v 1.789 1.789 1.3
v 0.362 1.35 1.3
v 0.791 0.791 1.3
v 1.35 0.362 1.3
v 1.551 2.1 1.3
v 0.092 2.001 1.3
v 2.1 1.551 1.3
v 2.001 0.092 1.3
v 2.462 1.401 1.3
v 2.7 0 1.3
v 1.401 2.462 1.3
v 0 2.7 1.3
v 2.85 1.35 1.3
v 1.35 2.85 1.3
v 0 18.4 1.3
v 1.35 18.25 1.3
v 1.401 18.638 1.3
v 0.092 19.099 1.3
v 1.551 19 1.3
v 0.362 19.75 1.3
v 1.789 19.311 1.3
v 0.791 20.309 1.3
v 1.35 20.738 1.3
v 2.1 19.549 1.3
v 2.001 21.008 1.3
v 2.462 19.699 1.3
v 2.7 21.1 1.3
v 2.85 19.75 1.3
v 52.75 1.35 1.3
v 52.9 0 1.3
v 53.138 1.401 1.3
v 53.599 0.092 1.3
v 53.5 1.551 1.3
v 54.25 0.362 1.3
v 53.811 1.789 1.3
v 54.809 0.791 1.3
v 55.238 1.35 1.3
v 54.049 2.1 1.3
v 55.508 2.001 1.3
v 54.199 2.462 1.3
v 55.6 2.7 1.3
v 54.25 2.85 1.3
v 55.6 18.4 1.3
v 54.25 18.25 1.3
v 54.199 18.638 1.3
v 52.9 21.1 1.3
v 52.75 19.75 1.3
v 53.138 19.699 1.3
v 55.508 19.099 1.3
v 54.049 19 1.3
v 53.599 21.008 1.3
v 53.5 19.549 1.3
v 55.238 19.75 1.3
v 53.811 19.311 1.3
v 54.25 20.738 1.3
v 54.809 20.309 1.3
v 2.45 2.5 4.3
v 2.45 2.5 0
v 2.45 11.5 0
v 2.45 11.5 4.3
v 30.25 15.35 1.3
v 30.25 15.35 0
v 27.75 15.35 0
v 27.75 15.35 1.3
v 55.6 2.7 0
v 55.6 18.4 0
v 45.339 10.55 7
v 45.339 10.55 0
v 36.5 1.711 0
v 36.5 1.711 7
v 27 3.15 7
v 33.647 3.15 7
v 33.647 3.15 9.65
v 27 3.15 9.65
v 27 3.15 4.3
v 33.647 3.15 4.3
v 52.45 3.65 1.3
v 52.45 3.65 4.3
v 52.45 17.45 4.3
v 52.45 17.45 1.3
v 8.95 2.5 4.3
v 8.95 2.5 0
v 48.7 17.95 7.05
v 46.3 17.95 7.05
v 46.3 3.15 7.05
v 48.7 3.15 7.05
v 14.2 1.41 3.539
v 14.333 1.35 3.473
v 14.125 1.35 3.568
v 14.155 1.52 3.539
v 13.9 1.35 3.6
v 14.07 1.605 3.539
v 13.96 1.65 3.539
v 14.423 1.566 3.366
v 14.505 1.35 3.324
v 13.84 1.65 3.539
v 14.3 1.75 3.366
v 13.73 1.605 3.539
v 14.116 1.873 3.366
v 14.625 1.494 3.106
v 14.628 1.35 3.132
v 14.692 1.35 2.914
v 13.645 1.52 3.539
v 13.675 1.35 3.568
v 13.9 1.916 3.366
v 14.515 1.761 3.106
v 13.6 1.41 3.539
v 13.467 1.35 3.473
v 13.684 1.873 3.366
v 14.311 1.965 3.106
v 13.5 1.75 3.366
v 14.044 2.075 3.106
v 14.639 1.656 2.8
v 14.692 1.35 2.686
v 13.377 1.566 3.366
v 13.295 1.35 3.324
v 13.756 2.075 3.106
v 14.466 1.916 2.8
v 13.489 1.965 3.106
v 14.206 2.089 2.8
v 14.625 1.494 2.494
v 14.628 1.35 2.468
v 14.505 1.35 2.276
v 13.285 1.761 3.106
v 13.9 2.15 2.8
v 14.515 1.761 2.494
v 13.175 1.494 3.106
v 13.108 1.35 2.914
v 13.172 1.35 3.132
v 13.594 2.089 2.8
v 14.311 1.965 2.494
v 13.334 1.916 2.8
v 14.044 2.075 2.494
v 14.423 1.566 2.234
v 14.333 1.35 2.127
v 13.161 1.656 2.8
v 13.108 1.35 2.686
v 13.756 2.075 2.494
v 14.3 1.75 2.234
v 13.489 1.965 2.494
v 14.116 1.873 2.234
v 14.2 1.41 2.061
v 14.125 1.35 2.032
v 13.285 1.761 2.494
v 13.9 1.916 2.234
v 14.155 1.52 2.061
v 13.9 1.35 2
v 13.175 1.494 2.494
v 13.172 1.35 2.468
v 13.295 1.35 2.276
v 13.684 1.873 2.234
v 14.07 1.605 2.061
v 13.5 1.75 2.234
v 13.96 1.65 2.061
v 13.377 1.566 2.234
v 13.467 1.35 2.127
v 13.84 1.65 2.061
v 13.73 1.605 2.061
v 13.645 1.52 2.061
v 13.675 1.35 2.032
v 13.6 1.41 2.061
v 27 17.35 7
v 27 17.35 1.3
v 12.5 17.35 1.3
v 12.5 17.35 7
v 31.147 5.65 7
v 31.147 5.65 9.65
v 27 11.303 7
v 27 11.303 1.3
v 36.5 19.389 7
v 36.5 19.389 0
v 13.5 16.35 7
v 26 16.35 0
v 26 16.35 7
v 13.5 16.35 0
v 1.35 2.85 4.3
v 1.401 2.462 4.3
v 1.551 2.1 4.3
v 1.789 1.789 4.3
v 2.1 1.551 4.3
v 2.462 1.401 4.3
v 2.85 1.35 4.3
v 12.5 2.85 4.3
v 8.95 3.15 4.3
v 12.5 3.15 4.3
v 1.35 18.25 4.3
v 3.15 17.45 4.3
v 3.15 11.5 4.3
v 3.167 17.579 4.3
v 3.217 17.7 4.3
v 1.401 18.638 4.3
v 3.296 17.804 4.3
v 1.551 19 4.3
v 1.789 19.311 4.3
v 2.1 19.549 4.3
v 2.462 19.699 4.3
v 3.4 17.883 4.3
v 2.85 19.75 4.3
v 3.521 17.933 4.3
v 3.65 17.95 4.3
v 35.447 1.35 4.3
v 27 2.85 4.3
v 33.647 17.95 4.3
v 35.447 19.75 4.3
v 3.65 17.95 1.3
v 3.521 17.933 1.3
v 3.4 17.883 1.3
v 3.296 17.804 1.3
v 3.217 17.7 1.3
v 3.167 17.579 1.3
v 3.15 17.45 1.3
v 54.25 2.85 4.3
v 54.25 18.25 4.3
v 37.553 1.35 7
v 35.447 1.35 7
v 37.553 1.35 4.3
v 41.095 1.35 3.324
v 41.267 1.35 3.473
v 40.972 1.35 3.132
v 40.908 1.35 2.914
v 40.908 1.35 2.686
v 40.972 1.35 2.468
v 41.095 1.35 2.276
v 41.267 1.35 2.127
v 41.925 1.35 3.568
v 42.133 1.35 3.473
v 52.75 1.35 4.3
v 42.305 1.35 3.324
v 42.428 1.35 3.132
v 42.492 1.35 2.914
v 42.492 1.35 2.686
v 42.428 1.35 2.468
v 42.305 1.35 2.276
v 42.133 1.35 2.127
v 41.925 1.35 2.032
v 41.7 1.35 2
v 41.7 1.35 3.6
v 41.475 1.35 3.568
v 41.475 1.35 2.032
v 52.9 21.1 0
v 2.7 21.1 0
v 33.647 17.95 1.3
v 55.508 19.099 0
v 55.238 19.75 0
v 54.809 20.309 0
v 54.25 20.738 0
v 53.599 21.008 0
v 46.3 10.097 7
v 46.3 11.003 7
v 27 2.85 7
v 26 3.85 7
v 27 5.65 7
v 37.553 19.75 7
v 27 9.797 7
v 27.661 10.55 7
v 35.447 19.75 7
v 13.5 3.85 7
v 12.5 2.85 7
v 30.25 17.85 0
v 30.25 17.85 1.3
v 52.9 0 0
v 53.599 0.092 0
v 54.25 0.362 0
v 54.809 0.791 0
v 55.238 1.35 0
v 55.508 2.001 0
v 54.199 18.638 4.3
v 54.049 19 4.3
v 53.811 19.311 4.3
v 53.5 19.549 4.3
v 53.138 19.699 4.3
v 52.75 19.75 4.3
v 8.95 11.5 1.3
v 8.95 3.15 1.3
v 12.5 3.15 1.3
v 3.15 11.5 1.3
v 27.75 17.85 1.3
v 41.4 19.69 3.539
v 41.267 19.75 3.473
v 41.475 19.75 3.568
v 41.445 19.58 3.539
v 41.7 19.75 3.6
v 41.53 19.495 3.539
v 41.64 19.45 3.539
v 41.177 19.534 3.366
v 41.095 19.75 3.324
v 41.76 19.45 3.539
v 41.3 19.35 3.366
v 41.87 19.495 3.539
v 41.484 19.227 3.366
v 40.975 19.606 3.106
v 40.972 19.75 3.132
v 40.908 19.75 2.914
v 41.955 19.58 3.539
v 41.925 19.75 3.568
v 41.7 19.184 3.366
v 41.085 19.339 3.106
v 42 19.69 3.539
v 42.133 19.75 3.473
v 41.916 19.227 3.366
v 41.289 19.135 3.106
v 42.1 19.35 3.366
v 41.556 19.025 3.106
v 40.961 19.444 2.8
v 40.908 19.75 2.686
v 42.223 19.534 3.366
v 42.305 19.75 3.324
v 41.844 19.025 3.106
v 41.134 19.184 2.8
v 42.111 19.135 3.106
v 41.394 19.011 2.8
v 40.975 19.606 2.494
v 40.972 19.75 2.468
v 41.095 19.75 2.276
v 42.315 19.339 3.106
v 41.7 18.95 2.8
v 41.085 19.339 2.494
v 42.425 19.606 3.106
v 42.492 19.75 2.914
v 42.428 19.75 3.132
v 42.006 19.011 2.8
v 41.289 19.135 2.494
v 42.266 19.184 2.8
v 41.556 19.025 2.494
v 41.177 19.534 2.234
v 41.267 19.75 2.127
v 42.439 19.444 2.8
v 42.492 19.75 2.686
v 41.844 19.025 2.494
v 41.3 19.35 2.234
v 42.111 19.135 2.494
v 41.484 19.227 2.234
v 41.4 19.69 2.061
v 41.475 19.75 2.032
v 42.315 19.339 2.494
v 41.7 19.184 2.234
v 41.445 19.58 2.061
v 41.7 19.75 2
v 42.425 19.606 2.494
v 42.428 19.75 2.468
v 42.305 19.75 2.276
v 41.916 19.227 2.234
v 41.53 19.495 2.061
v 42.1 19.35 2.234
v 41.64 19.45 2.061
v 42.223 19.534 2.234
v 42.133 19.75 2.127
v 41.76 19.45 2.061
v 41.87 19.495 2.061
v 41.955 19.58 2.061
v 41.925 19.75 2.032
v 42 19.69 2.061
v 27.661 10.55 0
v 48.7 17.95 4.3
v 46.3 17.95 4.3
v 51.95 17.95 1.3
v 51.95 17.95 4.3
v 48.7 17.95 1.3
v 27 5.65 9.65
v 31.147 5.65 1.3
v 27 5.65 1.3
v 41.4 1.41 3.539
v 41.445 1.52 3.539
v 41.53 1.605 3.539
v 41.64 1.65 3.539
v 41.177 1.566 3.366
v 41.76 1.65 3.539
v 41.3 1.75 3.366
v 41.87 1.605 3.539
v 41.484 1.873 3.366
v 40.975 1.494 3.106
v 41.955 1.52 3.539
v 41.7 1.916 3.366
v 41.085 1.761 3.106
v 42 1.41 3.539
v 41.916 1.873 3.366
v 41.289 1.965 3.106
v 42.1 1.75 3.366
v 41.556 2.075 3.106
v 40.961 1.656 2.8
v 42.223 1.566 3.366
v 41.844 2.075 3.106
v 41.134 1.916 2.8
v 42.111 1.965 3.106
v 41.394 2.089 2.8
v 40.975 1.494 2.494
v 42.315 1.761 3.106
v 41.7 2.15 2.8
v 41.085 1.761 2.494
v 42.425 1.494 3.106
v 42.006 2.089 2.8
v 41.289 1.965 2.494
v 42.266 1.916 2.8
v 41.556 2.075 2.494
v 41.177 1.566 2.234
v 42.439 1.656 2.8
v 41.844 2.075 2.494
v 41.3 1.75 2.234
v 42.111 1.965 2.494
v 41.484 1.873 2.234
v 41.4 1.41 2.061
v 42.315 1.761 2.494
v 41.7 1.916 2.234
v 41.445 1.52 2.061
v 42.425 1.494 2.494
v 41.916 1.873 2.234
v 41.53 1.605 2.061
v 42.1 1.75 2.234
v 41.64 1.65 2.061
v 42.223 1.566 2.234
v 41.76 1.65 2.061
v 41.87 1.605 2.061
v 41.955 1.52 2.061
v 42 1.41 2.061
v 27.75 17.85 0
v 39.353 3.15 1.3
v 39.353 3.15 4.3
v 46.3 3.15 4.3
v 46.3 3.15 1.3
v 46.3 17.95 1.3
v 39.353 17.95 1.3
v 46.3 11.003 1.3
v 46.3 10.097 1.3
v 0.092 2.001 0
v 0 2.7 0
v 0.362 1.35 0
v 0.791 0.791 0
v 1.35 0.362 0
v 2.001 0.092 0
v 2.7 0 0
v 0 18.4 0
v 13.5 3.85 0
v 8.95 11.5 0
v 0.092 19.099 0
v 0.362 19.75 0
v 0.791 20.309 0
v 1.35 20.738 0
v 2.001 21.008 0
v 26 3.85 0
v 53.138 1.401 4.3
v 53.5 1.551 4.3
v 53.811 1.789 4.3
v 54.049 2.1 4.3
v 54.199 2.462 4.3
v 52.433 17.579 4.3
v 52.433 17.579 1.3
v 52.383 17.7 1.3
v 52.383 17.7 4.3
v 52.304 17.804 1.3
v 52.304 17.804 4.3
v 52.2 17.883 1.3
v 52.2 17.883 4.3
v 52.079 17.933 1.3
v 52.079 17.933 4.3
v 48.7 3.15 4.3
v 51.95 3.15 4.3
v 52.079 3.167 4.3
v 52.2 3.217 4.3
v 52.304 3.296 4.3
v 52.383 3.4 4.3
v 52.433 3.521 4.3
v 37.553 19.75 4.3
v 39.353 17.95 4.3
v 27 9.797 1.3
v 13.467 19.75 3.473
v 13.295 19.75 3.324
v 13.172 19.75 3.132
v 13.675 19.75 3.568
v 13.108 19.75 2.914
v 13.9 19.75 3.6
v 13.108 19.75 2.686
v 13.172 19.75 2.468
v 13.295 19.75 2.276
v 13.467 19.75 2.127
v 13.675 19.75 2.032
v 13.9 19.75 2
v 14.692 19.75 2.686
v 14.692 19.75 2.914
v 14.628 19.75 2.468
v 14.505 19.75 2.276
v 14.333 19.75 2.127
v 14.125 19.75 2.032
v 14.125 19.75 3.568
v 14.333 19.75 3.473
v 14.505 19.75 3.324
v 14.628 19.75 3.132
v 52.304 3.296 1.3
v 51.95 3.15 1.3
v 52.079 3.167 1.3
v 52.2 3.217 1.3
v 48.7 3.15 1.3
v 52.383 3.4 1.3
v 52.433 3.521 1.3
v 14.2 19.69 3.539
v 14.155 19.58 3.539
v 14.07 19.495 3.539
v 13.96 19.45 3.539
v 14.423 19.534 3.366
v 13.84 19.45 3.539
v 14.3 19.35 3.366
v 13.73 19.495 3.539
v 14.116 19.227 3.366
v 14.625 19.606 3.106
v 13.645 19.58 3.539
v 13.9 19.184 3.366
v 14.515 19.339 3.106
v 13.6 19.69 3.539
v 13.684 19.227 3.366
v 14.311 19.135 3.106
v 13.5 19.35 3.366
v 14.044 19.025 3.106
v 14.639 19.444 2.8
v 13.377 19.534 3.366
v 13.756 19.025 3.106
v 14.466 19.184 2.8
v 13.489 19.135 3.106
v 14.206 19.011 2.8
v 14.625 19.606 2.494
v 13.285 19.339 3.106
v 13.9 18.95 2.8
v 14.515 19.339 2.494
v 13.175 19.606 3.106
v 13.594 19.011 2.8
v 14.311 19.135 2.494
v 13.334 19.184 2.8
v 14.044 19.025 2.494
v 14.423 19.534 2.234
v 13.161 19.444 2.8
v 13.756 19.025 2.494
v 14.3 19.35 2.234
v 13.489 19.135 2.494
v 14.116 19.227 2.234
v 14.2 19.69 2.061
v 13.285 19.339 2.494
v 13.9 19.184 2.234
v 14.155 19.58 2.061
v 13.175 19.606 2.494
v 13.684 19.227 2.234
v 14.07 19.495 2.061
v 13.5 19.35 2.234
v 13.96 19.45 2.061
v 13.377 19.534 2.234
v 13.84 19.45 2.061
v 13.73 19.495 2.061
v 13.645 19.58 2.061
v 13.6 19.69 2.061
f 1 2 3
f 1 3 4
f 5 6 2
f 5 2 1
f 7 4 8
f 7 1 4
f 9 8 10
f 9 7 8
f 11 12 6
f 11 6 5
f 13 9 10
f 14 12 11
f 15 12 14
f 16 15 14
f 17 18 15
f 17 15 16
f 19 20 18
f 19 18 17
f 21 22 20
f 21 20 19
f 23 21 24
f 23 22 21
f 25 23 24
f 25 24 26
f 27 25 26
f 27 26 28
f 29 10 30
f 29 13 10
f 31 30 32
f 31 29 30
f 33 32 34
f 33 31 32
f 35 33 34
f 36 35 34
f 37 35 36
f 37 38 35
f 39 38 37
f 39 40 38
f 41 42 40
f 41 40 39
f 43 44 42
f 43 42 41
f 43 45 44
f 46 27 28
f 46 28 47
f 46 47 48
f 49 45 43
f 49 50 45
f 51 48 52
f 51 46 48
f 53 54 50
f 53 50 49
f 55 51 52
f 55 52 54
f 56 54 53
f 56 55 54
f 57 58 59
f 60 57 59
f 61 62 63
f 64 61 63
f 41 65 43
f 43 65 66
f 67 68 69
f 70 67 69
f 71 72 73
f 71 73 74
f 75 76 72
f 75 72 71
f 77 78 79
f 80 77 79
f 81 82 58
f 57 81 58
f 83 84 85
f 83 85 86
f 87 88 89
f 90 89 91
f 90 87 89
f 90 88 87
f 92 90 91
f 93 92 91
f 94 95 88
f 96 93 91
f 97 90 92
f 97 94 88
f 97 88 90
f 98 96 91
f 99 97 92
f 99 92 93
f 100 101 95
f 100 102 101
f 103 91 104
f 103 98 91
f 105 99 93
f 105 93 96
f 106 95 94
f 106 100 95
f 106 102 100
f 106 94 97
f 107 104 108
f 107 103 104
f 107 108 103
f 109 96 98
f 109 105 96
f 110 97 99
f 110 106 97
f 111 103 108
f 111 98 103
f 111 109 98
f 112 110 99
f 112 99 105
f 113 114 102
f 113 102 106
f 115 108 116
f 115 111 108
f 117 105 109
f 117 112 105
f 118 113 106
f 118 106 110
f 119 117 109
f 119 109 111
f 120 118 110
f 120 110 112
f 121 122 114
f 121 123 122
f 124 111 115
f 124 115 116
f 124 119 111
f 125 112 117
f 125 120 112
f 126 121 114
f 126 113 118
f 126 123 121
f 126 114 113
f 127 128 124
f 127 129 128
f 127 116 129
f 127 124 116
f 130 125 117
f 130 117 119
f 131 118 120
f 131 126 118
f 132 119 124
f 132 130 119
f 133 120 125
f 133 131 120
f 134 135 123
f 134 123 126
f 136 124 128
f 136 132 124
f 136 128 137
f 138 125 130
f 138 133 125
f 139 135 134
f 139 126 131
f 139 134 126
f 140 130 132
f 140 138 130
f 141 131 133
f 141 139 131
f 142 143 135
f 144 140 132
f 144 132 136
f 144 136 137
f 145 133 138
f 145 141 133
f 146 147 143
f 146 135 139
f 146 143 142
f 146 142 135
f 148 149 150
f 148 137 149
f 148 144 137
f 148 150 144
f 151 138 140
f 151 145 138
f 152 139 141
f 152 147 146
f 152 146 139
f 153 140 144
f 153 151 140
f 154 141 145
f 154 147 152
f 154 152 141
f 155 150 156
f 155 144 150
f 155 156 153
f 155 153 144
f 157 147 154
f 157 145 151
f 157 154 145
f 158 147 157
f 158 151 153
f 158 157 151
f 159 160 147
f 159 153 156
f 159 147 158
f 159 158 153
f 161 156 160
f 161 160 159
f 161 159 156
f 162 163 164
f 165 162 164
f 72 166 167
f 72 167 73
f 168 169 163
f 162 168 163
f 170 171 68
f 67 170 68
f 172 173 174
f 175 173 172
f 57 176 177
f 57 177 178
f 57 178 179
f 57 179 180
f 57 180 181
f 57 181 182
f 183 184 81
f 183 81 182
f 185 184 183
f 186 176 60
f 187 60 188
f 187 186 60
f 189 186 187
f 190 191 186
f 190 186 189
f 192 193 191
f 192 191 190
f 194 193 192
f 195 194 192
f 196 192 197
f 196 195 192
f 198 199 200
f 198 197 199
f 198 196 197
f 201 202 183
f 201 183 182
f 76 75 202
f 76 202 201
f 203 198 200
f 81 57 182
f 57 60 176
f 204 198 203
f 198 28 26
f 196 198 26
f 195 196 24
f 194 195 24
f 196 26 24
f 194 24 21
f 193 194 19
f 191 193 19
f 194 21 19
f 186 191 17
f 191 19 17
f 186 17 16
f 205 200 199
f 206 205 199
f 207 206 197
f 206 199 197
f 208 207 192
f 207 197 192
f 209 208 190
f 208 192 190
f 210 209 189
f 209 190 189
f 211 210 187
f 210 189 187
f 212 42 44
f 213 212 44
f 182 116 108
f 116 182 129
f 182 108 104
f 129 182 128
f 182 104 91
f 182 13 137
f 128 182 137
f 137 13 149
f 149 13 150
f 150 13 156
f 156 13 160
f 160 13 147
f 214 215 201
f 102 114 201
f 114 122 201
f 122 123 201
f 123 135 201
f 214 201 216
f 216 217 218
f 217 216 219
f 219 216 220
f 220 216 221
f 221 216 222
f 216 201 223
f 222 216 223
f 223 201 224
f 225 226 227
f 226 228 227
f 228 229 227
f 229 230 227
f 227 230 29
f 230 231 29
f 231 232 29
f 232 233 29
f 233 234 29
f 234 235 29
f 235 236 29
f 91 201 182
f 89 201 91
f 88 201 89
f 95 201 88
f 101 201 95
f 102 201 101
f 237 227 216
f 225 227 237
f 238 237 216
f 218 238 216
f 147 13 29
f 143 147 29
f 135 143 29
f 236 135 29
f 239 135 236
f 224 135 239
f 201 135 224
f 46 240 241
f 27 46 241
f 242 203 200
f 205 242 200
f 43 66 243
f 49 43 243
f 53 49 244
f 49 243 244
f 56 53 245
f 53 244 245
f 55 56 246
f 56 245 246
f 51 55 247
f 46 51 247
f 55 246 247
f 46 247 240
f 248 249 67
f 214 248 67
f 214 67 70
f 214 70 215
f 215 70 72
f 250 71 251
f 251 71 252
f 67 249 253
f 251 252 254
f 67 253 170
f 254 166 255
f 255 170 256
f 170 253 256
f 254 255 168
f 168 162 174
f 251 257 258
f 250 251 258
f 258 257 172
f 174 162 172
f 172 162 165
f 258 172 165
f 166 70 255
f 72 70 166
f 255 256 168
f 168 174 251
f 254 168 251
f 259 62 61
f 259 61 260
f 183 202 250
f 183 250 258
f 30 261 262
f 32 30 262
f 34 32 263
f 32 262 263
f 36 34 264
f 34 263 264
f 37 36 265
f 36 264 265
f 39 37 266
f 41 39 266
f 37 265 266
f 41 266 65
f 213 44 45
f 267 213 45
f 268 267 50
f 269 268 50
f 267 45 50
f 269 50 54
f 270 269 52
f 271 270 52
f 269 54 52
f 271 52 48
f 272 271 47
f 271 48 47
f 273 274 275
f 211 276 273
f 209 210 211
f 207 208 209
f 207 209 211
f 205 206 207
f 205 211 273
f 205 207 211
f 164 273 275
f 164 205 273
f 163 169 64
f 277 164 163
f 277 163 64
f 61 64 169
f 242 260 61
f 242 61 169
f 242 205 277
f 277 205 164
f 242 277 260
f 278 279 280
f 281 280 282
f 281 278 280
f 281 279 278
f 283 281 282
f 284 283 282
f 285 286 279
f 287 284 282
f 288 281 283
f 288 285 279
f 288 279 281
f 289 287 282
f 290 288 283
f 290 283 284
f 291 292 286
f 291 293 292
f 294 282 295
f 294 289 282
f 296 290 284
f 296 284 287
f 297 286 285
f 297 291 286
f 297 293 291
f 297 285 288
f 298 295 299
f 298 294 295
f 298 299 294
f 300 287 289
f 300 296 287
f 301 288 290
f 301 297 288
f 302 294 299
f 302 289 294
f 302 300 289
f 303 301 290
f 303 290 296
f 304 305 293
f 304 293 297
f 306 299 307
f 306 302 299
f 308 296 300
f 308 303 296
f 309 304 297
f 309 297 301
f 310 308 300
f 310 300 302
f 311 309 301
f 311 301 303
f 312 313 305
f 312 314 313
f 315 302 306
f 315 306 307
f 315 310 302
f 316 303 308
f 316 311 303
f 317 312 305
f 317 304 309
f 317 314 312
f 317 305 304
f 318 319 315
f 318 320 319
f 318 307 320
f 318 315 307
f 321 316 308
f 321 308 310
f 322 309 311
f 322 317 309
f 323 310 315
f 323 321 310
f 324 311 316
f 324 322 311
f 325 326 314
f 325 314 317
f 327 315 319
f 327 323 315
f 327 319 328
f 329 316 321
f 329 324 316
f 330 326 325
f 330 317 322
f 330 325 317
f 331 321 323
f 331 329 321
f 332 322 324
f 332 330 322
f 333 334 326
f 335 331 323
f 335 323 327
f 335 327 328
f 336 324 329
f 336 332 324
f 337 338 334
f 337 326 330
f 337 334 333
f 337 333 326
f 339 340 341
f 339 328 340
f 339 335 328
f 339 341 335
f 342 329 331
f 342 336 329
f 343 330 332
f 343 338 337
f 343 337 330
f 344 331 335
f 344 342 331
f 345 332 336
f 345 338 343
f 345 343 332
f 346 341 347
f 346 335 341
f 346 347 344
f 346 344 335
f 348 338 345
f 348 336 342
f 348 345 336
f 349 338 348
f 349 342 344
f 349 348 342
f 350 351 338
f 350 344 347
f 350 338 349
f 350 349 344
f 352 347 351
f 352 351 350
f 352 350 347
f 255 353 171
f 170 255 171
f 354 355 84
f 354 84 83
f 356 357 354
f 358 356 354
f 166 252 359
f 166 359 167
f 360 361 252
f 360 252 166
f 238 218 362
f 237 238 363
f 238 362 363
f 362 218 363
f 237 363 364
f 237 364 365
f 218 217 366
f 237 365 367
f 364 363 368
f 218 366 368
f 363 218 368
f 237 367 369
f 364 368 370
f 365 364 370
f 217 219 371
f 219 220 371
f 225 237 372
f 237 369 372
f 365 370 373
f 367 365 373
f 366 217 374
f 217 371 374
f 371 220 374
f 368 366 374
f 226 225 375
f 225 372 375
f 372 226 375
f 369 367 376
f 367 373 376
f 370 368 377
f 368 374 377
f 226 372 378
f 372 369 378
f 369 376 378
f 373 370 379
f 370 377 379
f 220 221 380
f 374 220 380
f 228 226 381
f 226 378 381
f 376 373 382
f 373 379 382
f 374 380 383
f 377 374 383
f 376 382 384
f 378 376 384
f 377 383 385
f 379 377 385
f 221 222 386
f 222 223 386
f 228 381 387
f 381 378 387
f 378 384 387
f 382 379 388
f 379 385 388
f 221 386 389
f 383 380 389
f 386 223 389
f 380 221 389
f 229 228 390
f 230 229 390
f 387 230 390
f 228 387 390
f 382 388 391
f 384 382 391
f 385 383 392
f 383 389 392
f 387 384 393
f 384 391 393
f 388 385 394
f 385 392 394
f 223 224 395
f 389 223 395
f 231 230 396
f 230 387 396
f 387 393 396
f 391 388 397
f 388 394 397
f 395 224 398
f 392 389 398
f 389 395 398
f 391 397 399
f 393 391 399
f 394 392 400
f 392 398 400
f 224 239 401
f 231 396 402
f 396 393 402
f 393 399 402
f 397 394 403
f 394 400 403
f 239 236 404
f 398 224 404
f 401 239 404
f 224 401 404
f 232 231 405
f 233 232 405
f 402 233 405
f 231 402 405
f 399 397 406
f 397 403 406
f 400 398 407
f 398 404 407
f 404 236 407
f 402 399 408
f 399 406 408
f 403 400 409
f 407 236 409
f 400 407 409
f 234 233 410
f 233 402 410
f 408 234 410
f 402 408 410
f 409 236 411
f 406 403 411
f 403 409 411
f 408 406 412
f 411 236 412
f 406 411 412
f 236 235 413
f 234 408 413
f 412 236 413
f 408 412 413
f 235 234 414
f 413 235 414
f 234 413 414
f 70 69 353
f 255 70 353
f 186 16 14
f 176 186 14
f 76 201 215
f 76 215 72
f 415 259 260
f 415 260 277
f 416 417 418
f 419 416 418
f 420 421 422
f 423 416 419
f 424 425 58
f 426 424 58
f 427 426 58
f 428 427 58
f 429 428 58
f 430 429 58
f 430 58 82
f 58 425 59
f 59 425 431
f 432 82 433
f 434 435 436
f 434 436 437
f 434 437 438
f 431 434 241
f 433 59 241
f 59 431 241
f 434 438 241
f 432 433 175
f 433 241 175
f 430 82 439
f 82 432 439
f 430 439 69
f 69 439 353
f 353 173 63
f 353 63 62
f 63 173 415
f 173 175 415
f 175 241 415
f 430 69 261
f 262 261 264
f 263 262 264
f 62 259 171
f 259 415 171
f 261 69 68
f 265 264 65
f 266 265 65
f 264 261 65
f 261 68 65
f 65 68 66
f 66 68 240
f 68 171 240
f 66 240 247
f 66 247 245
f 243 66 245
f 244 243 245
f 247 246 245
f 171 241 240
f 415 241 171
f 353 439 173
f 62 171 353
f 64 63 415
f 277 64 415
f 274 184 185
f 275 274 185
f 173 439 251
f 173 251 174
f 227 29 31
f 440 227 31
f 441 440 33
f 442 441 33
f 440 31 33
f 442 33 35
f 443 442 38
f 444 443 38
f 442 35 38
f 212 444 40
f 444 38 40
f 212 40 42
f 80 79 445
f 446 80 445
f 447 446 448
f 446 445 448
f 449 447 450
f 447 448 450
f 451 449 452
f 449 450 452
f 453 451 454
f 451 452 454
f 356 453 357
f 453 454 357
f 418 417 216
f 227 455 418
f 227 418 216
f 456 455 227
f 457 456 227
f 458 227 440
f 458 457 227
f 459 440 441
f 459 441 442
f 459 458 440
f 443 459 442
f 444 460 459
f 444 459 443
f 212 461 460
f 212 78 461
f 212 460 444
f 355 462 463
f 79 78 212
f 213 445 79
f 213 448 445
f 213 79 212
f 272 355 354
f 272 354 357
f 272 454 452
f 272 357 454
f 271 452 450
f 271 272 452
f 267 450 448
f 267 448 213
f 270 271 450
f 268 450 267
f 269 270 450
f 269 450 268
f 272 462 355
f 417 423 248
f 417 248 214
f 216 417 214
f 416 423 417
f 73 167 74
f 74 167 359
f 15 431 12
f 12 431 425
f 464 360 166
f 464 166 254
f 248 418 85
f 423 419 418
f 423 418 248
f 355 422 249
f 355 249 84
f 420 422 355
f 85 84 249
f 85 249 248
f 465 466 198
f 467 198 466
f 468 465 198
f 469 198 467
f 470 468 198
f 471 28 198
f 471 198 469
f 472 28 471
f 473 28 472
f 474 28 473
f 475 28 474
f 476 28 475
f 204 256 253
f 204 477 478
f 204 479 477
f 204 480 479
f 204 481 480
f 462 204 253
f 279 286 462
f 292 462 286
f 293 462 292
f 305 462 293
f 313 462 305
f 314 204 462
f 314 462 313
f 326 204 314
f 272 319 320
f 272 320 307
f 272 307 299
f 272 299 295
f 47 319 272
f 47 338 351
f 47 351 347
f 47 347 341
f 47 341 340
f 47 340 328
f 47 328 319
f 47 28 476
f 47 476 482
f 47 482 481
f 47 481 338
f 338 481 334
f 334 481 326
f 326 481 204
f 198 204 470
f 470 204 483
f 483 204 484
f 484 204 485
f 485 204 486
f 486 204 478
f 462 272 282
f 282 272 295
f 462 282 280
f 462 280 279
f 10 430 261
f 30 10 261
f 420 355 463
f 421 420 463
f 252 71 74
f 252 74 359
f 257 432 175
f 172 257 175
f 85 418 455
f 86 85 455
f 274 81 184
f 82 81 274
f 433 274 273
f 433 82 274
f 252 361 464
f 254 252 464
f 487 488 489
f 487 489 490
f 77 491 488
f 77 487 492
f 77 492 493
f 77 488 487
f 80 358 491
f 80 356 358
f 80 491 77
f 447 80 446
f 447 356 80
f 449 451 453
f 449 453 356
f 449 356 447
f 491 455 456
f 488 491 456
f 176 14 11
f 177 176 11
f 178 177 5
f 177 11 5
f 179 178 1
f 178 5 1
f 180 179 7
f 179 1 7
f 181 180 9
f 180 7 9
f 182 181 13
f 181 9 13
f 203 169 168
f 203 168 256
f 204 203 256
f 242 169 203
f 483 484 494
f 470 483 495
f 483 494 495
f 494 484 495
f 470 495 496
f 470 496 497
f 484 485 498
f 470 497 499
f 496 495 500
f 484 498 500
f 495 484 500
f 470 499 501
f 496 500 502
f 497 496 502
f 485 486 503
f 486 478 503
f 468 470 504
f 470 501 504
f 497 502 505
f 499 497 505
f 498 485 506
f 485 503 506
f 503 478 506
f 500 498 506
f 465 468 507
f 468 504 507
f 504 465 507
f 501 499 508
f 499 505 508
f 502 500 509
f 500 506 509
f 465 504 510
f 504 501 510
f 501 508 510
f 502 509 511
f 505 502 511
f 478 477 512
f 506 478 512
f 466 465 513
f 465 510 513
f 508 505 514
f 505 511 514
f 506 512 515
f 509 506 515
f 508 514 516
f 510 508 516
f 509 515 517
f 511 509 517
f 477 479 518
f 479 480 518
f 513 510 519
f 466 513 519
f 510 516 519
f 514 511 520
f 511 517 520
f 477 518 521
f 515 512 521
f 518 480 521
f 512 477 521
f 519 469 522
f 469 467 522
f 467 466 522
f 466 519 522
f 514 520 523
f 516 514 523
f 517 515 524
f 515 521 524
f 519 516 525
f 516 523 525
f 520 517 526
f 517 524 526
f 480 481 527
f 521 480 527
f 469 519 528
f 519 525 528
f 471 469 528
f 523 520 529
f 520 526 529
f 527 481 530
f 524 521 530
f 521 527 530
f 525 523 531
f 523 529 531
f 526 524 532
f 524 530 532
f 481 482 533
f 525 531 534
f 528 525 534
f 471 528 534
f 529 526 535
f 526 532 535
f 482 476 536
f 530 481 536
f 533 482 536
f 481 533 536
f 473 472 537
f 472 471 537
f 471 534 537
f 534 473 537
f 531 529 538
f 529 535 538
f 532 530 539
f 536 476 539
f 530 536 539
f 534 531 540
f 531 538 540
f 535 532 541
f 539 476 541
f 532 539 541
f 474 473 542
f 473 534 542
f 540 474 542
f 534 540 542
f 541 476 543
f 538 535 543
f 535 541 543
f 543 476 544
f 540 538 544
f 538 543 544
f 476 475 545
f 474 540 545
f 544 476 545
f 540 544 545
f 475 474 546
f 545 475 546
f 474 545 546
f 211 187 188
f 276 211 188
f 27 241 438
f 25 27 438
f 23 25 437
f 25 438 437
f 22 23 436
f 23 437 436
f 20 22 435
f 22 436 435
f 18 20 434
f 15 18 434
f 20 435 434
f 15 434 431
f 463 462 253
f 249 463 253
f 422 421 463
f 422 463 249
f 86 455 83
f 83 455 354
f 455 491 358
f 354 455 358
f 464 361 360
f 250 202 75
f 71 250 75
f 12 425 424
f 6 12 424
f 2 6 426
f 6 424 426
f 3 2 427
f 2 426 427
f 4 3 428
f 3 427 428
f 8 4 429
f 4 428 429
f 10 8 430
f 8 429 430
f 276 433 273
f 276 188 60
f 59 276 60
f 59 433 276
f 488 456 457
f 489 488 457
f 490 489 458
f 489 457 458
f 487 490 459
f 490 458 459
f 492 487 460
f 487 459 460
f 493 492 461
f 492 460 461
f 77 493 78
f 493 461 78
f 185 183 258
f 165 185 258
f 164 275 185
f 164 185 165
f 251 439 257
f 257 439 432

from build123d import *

# Parameters (mm, degrees)
BOSS_EXTRUDE1_DEPTH = 1.3
BOSS_EXTRUDE3_DEPTH = 3
CUT_EXTRUDE1_DEPTH  = 3
SKETCH11_W          = 6.5
SKETCH11_H          = 9
CUT_EXTRUDE2_DEPTH  = 4.3
SKETCH12_W          = 12.5
SKETCH12_H          = 12.5
CUT_EXTRUDE4_DEPTH  = 1.3
SKETCH17_W          = 14.5
SKETCH17_H          = 14.5
SKETCH17_W_2        = 12.5
SKETCH17_H_2        = 12.5
BOSS_EXTRUDE4_DEPTH = 7
CUT_EXTRUDE5_DEPTH  = 4.3
BOSS_EXTRUDE5_DEPTH = 7
CUT_EXTRUDE6_START  = -3
CUT_EXTRUDE6_DEPTH  = 23
SKETCH21_W          = 2.5
SKETCH21_H          = 2.5
CUT_EXTRUDE7_DEPTH  = 10
SKETCH23_W          = 2.4
SKETCH23_H          = 14.8
BOSS_EXTRUDE6_DEPTH = 5.75
BOSS_EXTRUDE7_DEPTH = 8.35


with BuildPart() as part:
    # Sketch1 → Boss-Extrude1 (new body)
    with BuildSketch(Plane.XY):
        with BuildLine():
            Line((2.7, 0), (52.9, 0))
            ThreePointArc((52.9, 0), (54.809188309, 0.790811691), (55.6, 2.7))
            Line((55.6, 2.7), (55.6, 18.4))
            ThreePointArc((55.6, 18.4), (54.809188309, 20.309188309), (52.9, 21.1))
            Line((52.9, 21.1), (2.7, 21.1))
            ThreePointArc((2.7, 21.1), (0.790811691, 20.309188309), (0, 18.4))
            Line((0, 18.4), (0, 2.7))
            ThreePointArc((0, 2.7), (0.790811691, 0.790811691), (2.7, 0))
        make_face()
    extrude(amount=BOSS_EXTRUDE1_DEPTH)

    # Sketch4 → Boss-Extrude3 (add)
    with BuildSketch(Plane.XY.offset(1.3)):
        with BuildLine():
            Line((54.25, 2.85), (54.25, 18.25))
            ThreePointArc((54.25, 18.25), (53.810660172, 19.310660172), (52.75, 19.75))
            Line((52.75, 19.75), (2.85, 19.75))
            ThreePointArc((2.85, 19.75), (1.789339828, 19.310660172), (1.35, 18.25))
            Line((1.35, 18.25), (1.35, 2.85))
            ThreePointArc((1.35, 2.85), (1.789339828, 1.789339828), (2.85, 1.35))
            Line((2.85, 1.35), (52.75, 1.35))
            ThreePointArc((52.75, 1.35), (53.810660172, 1.789339828), (54.25, 2.85))
        make_face()
    extrude(amount=BOSS_EXTRUDE3_DEPTH)

    # Sketch5 → Cut-Extrude1 (cut)
    with BuildSketch(Plane.XY.offset(4.3)):
        with BuildLine():
            Line((51.95, 17.95), (3.65, 17.95))
            ThreePointArc((3.65, 17.95), (3.296446609, 17.803553391), (3.15, 17.45))
            Line((3.15, 17.45), (3.15, 3.65))
            ThreePointArc((3.15, 3.65), (3.296446609, 3.296446609), (3.65, 3.15))
            Line((3.65, 3.15), (51.95, 3.15))
            ThreePointArc((51.95, 3.15), (52.303553391, 3.296446609), (52.45, 3.65))
            Line((52.45, 3.65), (52.45, 17.45))
            ThreePointArc((52.45, 17.45), (52.303553391, 17.803553391), (51.95, 17.95))
        make_face()
    extrude(amount=-CUT_EXTRUDE1_DEPTH, mode=Mode.SUBTRACT)

    # Sketch10 → Cut-Revolve1 (revolve, cut)
    with BuildSketch(Plane(origin=(0, 19.75, 0), x_dir=(1, 0, 0), z_dir=(0, 1, 0))):
        with BuildLine():
            Line((41.7, -2), (41.7, -3.6))
            ThreePointArc((41.7, -3.6), (40.9, -2.8), (41.7, -2))
        make_face()
    cut_revolve1 = revolve(axis=Axis((41.7, 19.75, 2), (0, 0, 1)), mode=Mode.SUBTRACT)

    # Mirror1: Cut-Revolve1 across plane
    add(cut_revolve1.mirror(Plane(origin=(0, 10.55, 0), x_dir=(0, 0, 1), z_dir=(0, -1, 0))), mode=Mode.SUBTRACT)

    # Sketch11 → Cut-Extrude2 (cut)
    with BuildSketch(Plane(origin=(0, 0, 0), x_dir=(-1, 0, 0), z_dir=(0, 0, -1))):
        with Locations((-5.7, 7)):
            Rectangle(SKETCH11_W, SKETCH11_H)
    extrude(amount=-CUT_EXTRUDE2_DEPTH, mode=Mode.SUBTRACT)

    # Sketch12 → Cut-Extrude4 (cut)
    with BuildSketch(Plane(origin=(0, 0, 0), x_dir=(-1, 0, 0), z_dir=(0, 0, -1))):
        with Locations((-19.75, 10.1)):
            Rectangle(SKETCH12_W, SKETCH12_H)
    extrude(amount=-CUT_EXTRUDE4_DEPTH, mode=Mode.SUBTRACT)

    # Sketch17 → Boss-Extrude4 (add)
    with BuildSketch(Plane(origin=(0, 0, 0), x_dir=(-1, 0, 0), z_dir=(0, 0, -1))):
        with Locations((-19.75, 10.1)):
            Rectangle(SKETCH17_W, SKETCH17_H)
        with Locations((-19.75, 10.1)):
            Rectangle(SKETCH17_W_2, SKETCH17_H_2, mode=Mode.SUBTRACT)
    extrude(amount=-BOSS_EXTRUDE4_DEPTH)

    # Sketch13 → Cut-Extrude5 (cut)
    with BuildSketch(Plane(origin=(0, 0, 0), x_dir=(-1, 0, 0), z_dir=(0, 0, -1))):
        Polygon((-45.338834765, 10.55), (-36.5, 1.711165235), (-27.661165235, 10.55), (-36.5, 19.388834765), align=None)
    extrude(amount=-CUT_EXTRUDE5_DEPTH, mode=Mode.SUBTRACT)

    # Sketch18 → Boss-Extrude5 (add)
    with BuildSketch(Plane(origin=(0, 0, 0), x_dir=(-1, 0, 0), z_dir=(0, 0, -1))):
        Polygon((-46.753048327, 10.55), (-36.5, 0.296951673), (-26.246951673, 10.55), (-36.5, 20.803048327), align=None)
        Polygon((-36.5, 19.388834765), (-45.338834765, 10.55), (-36.5, 1.711165235), (-27.661165235, 10.55), align=None, mode=Mode.SUBTRACT)
    extrude(amount=-BOSS_EXTRUDE5_DEPTH)

    # Sketch20 → Cut-Extrude6 (cut)
    with BuildSketch(Plane.XY.offset(4.3).offset(CUT_EXTRUDE6_START)):
        Polygon((35.446951673, 19.75), (37.553048327, 19.75), (36.5, 20.803048327), align=None)
    cut_extrude6 = extrude(amount=CUT_EXTRUDE6_DEPTH, mode=Mode.SUBTRACT)

    # Mirror2: Cut-Extrude6 across plane
    add(cut_extrude6.mirror(Plane(origin=(0, 10.55, 0), x_dir=(0, 0, 1), z_dir=(0, -1, 0))), mode=Mode.SUBTRACT)

    # Sketch21 → Cut-Extrude7 (cut)
    with BuildSketch(Plane(origin=(0, 0, 0), x_dir=(-1, 0, 0), z_dir=(0, 0, -1))):
        with Locations((-29, 16.6)):
            Rectangle(SKETCH21_W, SKETCH21_H)
    extrude(amount=-CUT_EXTRUDE7_DEPTH, mode=Mode.SUBTRACT)

    # Mirror3: Cut-Revolve1 across plane
    add(cut_revolve1.mirror(Plane.ZY.offset(-27.8)), mode=Mode.SUBTRACT)

    # Mirror3 copy 1 sketch → Mirror3 copy 1 (revolve, cut)
    with BuildSketch(Plane(origin=(55.6, 1.35, 0), x_dir=(-1, 0, 0), z_dir=(0, -1, 0))):
        with BuildLine():
            Line((41.7, -2), (41.7, -3.6))
            ThreePointArc((41.7, -3.6), (40.9, -2.8), (41.7, -2))
        make_face()
    revolve(axis=Axis((13.9, 1.35, 2), (0, 0, 1)), mode=Mode.SUBTRACT)

    # Sketch23 → Boss-Extrude6 (add)
    with BuildSketch(Plane.XY.offset(1.3)):
        with Locations((47.5, 10.55)):
            Rectangle(SKETCH23_W, SKETCH23_H)
    extrude(amount=BOSS_EXTRUDE6_DEPTH)

    # Sketch24 → Boss-Extrude7 (add)
    with BuildSketch(Plane.XY.offset(1.3)):
        Polygon((33.646951673, 3.15), (27, 3.15), (27, 5.65), (31.146951673, 5.65), align=None)
    extrude(amount=BOSS_EXTRUDE7_DEPTH)


solid = part.part
